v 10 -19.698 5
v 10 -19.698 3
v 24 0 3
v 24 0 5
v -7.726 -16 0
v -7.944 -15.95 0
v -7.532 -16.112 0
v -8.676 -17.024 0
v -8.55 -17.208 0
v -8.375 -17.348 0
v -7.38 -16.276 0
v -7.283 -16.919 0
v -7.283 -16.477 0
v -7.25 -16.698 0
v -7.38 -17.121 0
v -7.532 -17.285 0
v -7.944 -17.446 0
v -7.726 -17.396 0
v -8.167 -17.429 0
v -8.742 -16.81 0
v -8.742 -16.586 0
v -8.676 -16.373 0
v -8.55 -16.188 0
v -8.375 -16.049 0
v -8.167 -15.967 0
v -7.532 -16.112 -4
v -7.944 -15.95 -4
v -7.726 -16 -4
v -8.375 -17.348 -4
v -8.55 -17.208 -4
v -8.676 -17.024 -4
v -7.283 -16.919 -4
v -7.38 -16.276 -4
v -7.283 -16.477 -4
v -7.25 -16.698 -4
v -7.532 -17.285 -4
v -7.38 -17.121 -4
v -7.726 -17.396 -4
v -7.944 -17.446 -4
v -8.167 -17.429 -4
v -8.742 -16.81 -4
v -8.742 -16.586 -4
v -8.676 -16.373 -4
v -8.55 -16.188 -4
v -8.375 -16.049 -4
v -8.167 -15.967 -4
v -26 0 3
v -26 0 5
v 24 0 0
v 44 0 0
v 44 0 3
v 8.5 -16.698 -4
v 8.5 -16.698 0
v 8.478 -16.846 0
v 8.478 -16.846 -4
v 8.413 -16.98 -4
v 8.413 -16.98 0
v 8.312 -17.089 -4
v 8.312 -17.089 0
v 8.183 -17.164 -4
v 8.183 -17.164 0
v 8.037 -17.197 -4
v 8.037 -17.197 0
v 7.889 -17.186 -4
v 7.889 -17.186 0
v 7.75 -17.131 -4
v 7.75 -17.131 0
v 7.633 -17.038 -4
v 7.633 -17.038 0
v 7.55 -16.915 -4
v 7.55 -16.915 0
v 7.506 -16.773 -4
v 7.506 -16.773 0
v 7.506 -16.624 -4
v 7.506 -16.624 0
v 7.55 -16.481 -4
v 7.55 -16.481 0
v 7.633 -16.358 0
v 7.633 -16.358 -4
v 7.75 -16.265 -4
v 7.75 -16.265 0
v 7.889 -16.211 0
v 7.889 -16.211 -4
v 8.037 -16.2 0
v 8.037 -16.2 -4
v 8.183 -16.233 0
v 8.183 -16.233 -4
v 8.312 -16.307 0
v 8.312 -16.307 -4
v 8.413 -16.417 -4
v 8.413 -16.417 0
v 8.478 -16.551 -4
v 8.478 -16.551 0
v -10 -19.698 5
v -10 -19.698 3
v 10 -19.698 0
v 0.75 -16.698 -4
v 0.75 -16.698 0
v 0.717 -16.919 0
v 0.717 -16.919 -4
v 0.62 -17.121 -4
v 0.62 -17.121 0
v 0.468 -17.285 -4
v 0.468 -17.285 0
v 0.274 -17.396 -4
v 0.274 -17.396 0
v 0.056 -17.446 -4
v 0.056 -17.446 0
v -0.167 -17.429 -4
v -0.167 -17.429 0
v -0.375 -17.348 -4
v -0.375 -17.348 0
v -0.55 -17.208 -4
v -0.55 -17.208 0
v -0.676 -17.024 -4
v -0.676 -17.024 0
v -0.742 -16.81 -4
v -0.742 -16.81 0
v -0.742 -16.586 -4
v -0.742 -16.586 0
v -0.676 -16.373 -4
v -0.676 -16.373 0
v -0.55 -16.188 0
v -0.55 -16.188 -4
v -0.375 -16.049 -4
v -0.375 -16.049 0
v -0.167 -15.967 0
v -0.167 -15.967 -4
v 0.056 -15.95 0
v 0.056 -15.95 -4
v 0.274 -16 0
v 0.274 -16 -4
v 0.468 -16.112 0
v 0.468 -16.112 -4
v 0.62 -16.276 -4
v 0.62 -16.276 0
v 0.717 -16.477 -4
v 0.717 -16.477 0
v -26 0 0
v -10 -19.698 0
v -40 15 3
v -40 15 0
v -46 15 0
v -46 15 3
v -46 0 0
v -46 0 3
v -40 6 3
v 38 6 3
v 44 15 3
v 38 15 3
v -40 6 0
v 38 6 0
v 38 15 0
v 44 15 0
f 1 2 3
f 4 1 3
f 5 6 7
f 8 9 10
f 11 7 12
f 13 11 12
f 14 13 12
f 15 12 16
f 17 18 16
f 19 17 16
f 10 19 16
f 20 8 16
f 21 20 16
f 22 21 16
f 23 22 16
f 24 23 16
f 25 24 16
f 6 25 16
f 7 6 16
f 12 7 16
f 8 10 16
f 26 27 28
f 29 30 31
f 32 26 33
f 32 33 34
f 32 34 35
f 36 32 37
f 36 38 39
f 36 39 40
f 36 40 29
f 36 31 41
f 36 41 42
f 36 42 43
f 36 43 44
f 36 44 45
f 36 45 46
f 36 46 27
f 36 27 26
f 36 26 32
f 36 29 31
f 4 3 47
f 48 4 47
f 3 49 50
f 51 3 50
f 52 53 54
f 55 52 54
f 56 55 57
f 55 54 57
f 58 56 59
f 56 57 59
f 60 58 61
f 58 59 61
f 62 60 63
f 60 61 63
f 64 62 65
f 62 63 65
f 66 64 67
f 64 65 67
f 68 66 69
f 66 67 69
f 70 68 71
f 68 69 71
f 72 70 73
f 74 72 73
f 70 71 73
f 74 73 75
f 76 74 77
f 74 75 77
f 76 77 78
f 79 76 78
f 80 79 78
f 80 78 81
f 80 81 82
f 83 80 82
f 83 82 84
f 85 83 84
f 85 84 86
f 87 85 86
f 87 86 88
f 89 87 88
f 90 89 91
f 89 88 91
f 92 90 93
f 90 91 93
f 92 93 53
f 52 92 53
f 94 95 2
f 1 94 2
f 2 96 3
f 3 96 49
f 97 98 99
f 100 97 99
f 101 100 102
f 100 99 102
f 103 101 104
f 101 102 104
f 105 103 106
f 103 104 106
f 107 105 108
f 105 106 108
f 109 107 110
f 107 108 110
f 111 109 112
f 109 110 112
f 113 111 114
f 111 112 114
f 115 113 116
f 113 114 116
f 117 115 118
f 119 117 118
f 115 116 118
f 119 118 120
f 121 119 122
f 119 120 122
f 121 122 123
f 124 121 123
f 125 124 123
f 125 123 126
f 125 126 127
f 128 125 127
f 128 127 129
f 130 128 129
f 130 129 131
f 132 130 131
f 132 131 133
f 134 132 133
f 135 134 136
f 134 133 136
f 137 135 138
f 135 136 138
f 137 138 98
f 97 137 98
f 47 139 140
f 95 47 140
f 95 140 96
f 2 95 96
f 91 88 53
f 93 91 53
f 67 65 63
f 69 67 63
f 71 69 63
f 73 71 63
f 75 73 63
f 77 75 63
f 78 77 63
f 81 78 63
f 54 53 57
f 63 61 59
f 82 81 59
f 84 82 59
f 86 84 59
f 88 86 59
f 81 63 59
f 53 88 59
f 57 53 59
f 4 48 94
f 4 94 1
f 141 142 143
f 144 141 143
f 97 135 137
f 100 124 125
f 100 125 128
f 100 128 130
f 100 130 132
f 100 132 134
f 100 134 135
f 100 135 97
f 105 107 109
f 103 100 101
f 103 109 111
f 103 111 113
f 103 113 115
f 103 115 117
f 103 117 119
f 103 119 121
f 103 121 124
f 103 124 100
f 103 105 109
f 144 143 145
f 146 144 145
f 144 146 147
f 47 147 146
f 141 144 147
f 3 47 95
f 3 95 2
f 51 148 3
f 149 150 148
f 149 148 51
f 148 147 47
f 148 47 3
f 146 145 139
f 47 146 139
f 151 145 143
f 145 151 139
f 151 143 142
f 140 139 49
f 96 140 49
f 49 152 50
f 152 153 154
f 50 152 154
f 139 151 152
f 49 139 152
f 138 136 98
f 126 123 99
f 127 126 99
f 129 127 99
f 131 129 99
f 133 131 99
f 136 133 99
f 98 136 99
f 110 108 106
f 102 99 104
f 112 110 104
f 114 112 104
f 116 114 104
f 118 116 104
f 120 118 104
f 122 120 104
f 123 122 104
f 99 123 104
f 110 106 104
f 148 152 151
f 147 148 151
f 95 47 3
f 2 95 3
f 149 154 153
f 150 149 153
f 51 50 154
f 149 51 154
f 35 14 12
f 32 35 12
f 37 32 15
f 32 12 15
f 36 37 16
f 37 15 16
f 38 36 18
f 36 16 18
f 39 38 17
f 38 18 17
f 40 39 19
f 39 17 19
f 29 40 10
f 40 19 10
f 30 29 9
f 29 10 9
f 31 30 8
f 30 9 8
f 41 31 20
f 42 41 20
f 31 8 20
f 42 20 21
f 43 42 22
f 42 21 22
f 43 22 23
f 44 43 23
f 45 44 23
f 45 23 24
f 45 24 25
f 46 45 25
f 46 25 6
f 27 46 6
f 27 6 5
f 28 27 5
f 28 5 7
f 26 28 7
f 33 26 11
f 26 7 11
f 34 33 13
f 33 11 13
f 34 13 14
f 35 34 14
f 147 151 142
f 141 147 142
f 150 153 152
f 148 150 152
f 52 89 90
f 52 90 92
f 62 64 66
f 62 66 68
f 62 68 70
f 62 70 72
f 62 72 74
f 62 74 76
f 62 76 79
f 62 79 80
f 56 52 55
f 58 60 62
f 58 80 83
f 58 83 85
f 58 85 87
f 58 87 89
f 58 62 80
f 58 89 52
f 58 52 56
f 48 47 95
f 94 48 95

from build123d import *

# Parameters (mm, degrees)
F1_DEPTH = 3
F3_DEPTH = 2
F4_R     = 0.75
F4_R_2   = 0.5
F5_DEPTH = 4


with BuildPart() as f1:
    # F0 (on Top) → F1 (new body)
    with BuildSketch(Plane.XY):
        Polygon((-45.999706, 15), (-45.999706, 0), (-25.999706, 0), (24.000294, 0), (44.000294, 0), (44.000294, 15), (38.000294, 15), (38.000294, 6), (-39.999706, 6), (-39.999706, 15), align=None)
        Polygon((24.000294, 0), (-25.999706, 0), (-10, -19.698184), (10, -19.698184), align=None)
    extrude(amount=F1_DEPTH)


with BuildPart() as f3:
    # F2 (on face) → F3 (new body)
    with BuildSketch(Plane.XY.offset(3)):
        Polygon((24.000294, 0), (-25.999706, 0), (-10, -19.698184), (10, -19.698184), align=None)
    extrude(amount=F3_DEPTH)


with BuildPart() as f5:
    # F4 (on face) → F5 (new body)
    with BuildSketch(Plane(origin=(0, 0, 0), x_dir=(1, 0, 0), z_dir=(0, 0, -1))):
        with Locations((0, 16.698184)):
            Circle(F4_R)
        with Locations((8, 16.698184)):
            Circle(F4_R_2)
        with Locations((-8, 16.698184)):
            Circle(F4_R)
    extrude(amount=F5_DEPTH)


solid = Compound([f1.part, f3.part, f5.part])
